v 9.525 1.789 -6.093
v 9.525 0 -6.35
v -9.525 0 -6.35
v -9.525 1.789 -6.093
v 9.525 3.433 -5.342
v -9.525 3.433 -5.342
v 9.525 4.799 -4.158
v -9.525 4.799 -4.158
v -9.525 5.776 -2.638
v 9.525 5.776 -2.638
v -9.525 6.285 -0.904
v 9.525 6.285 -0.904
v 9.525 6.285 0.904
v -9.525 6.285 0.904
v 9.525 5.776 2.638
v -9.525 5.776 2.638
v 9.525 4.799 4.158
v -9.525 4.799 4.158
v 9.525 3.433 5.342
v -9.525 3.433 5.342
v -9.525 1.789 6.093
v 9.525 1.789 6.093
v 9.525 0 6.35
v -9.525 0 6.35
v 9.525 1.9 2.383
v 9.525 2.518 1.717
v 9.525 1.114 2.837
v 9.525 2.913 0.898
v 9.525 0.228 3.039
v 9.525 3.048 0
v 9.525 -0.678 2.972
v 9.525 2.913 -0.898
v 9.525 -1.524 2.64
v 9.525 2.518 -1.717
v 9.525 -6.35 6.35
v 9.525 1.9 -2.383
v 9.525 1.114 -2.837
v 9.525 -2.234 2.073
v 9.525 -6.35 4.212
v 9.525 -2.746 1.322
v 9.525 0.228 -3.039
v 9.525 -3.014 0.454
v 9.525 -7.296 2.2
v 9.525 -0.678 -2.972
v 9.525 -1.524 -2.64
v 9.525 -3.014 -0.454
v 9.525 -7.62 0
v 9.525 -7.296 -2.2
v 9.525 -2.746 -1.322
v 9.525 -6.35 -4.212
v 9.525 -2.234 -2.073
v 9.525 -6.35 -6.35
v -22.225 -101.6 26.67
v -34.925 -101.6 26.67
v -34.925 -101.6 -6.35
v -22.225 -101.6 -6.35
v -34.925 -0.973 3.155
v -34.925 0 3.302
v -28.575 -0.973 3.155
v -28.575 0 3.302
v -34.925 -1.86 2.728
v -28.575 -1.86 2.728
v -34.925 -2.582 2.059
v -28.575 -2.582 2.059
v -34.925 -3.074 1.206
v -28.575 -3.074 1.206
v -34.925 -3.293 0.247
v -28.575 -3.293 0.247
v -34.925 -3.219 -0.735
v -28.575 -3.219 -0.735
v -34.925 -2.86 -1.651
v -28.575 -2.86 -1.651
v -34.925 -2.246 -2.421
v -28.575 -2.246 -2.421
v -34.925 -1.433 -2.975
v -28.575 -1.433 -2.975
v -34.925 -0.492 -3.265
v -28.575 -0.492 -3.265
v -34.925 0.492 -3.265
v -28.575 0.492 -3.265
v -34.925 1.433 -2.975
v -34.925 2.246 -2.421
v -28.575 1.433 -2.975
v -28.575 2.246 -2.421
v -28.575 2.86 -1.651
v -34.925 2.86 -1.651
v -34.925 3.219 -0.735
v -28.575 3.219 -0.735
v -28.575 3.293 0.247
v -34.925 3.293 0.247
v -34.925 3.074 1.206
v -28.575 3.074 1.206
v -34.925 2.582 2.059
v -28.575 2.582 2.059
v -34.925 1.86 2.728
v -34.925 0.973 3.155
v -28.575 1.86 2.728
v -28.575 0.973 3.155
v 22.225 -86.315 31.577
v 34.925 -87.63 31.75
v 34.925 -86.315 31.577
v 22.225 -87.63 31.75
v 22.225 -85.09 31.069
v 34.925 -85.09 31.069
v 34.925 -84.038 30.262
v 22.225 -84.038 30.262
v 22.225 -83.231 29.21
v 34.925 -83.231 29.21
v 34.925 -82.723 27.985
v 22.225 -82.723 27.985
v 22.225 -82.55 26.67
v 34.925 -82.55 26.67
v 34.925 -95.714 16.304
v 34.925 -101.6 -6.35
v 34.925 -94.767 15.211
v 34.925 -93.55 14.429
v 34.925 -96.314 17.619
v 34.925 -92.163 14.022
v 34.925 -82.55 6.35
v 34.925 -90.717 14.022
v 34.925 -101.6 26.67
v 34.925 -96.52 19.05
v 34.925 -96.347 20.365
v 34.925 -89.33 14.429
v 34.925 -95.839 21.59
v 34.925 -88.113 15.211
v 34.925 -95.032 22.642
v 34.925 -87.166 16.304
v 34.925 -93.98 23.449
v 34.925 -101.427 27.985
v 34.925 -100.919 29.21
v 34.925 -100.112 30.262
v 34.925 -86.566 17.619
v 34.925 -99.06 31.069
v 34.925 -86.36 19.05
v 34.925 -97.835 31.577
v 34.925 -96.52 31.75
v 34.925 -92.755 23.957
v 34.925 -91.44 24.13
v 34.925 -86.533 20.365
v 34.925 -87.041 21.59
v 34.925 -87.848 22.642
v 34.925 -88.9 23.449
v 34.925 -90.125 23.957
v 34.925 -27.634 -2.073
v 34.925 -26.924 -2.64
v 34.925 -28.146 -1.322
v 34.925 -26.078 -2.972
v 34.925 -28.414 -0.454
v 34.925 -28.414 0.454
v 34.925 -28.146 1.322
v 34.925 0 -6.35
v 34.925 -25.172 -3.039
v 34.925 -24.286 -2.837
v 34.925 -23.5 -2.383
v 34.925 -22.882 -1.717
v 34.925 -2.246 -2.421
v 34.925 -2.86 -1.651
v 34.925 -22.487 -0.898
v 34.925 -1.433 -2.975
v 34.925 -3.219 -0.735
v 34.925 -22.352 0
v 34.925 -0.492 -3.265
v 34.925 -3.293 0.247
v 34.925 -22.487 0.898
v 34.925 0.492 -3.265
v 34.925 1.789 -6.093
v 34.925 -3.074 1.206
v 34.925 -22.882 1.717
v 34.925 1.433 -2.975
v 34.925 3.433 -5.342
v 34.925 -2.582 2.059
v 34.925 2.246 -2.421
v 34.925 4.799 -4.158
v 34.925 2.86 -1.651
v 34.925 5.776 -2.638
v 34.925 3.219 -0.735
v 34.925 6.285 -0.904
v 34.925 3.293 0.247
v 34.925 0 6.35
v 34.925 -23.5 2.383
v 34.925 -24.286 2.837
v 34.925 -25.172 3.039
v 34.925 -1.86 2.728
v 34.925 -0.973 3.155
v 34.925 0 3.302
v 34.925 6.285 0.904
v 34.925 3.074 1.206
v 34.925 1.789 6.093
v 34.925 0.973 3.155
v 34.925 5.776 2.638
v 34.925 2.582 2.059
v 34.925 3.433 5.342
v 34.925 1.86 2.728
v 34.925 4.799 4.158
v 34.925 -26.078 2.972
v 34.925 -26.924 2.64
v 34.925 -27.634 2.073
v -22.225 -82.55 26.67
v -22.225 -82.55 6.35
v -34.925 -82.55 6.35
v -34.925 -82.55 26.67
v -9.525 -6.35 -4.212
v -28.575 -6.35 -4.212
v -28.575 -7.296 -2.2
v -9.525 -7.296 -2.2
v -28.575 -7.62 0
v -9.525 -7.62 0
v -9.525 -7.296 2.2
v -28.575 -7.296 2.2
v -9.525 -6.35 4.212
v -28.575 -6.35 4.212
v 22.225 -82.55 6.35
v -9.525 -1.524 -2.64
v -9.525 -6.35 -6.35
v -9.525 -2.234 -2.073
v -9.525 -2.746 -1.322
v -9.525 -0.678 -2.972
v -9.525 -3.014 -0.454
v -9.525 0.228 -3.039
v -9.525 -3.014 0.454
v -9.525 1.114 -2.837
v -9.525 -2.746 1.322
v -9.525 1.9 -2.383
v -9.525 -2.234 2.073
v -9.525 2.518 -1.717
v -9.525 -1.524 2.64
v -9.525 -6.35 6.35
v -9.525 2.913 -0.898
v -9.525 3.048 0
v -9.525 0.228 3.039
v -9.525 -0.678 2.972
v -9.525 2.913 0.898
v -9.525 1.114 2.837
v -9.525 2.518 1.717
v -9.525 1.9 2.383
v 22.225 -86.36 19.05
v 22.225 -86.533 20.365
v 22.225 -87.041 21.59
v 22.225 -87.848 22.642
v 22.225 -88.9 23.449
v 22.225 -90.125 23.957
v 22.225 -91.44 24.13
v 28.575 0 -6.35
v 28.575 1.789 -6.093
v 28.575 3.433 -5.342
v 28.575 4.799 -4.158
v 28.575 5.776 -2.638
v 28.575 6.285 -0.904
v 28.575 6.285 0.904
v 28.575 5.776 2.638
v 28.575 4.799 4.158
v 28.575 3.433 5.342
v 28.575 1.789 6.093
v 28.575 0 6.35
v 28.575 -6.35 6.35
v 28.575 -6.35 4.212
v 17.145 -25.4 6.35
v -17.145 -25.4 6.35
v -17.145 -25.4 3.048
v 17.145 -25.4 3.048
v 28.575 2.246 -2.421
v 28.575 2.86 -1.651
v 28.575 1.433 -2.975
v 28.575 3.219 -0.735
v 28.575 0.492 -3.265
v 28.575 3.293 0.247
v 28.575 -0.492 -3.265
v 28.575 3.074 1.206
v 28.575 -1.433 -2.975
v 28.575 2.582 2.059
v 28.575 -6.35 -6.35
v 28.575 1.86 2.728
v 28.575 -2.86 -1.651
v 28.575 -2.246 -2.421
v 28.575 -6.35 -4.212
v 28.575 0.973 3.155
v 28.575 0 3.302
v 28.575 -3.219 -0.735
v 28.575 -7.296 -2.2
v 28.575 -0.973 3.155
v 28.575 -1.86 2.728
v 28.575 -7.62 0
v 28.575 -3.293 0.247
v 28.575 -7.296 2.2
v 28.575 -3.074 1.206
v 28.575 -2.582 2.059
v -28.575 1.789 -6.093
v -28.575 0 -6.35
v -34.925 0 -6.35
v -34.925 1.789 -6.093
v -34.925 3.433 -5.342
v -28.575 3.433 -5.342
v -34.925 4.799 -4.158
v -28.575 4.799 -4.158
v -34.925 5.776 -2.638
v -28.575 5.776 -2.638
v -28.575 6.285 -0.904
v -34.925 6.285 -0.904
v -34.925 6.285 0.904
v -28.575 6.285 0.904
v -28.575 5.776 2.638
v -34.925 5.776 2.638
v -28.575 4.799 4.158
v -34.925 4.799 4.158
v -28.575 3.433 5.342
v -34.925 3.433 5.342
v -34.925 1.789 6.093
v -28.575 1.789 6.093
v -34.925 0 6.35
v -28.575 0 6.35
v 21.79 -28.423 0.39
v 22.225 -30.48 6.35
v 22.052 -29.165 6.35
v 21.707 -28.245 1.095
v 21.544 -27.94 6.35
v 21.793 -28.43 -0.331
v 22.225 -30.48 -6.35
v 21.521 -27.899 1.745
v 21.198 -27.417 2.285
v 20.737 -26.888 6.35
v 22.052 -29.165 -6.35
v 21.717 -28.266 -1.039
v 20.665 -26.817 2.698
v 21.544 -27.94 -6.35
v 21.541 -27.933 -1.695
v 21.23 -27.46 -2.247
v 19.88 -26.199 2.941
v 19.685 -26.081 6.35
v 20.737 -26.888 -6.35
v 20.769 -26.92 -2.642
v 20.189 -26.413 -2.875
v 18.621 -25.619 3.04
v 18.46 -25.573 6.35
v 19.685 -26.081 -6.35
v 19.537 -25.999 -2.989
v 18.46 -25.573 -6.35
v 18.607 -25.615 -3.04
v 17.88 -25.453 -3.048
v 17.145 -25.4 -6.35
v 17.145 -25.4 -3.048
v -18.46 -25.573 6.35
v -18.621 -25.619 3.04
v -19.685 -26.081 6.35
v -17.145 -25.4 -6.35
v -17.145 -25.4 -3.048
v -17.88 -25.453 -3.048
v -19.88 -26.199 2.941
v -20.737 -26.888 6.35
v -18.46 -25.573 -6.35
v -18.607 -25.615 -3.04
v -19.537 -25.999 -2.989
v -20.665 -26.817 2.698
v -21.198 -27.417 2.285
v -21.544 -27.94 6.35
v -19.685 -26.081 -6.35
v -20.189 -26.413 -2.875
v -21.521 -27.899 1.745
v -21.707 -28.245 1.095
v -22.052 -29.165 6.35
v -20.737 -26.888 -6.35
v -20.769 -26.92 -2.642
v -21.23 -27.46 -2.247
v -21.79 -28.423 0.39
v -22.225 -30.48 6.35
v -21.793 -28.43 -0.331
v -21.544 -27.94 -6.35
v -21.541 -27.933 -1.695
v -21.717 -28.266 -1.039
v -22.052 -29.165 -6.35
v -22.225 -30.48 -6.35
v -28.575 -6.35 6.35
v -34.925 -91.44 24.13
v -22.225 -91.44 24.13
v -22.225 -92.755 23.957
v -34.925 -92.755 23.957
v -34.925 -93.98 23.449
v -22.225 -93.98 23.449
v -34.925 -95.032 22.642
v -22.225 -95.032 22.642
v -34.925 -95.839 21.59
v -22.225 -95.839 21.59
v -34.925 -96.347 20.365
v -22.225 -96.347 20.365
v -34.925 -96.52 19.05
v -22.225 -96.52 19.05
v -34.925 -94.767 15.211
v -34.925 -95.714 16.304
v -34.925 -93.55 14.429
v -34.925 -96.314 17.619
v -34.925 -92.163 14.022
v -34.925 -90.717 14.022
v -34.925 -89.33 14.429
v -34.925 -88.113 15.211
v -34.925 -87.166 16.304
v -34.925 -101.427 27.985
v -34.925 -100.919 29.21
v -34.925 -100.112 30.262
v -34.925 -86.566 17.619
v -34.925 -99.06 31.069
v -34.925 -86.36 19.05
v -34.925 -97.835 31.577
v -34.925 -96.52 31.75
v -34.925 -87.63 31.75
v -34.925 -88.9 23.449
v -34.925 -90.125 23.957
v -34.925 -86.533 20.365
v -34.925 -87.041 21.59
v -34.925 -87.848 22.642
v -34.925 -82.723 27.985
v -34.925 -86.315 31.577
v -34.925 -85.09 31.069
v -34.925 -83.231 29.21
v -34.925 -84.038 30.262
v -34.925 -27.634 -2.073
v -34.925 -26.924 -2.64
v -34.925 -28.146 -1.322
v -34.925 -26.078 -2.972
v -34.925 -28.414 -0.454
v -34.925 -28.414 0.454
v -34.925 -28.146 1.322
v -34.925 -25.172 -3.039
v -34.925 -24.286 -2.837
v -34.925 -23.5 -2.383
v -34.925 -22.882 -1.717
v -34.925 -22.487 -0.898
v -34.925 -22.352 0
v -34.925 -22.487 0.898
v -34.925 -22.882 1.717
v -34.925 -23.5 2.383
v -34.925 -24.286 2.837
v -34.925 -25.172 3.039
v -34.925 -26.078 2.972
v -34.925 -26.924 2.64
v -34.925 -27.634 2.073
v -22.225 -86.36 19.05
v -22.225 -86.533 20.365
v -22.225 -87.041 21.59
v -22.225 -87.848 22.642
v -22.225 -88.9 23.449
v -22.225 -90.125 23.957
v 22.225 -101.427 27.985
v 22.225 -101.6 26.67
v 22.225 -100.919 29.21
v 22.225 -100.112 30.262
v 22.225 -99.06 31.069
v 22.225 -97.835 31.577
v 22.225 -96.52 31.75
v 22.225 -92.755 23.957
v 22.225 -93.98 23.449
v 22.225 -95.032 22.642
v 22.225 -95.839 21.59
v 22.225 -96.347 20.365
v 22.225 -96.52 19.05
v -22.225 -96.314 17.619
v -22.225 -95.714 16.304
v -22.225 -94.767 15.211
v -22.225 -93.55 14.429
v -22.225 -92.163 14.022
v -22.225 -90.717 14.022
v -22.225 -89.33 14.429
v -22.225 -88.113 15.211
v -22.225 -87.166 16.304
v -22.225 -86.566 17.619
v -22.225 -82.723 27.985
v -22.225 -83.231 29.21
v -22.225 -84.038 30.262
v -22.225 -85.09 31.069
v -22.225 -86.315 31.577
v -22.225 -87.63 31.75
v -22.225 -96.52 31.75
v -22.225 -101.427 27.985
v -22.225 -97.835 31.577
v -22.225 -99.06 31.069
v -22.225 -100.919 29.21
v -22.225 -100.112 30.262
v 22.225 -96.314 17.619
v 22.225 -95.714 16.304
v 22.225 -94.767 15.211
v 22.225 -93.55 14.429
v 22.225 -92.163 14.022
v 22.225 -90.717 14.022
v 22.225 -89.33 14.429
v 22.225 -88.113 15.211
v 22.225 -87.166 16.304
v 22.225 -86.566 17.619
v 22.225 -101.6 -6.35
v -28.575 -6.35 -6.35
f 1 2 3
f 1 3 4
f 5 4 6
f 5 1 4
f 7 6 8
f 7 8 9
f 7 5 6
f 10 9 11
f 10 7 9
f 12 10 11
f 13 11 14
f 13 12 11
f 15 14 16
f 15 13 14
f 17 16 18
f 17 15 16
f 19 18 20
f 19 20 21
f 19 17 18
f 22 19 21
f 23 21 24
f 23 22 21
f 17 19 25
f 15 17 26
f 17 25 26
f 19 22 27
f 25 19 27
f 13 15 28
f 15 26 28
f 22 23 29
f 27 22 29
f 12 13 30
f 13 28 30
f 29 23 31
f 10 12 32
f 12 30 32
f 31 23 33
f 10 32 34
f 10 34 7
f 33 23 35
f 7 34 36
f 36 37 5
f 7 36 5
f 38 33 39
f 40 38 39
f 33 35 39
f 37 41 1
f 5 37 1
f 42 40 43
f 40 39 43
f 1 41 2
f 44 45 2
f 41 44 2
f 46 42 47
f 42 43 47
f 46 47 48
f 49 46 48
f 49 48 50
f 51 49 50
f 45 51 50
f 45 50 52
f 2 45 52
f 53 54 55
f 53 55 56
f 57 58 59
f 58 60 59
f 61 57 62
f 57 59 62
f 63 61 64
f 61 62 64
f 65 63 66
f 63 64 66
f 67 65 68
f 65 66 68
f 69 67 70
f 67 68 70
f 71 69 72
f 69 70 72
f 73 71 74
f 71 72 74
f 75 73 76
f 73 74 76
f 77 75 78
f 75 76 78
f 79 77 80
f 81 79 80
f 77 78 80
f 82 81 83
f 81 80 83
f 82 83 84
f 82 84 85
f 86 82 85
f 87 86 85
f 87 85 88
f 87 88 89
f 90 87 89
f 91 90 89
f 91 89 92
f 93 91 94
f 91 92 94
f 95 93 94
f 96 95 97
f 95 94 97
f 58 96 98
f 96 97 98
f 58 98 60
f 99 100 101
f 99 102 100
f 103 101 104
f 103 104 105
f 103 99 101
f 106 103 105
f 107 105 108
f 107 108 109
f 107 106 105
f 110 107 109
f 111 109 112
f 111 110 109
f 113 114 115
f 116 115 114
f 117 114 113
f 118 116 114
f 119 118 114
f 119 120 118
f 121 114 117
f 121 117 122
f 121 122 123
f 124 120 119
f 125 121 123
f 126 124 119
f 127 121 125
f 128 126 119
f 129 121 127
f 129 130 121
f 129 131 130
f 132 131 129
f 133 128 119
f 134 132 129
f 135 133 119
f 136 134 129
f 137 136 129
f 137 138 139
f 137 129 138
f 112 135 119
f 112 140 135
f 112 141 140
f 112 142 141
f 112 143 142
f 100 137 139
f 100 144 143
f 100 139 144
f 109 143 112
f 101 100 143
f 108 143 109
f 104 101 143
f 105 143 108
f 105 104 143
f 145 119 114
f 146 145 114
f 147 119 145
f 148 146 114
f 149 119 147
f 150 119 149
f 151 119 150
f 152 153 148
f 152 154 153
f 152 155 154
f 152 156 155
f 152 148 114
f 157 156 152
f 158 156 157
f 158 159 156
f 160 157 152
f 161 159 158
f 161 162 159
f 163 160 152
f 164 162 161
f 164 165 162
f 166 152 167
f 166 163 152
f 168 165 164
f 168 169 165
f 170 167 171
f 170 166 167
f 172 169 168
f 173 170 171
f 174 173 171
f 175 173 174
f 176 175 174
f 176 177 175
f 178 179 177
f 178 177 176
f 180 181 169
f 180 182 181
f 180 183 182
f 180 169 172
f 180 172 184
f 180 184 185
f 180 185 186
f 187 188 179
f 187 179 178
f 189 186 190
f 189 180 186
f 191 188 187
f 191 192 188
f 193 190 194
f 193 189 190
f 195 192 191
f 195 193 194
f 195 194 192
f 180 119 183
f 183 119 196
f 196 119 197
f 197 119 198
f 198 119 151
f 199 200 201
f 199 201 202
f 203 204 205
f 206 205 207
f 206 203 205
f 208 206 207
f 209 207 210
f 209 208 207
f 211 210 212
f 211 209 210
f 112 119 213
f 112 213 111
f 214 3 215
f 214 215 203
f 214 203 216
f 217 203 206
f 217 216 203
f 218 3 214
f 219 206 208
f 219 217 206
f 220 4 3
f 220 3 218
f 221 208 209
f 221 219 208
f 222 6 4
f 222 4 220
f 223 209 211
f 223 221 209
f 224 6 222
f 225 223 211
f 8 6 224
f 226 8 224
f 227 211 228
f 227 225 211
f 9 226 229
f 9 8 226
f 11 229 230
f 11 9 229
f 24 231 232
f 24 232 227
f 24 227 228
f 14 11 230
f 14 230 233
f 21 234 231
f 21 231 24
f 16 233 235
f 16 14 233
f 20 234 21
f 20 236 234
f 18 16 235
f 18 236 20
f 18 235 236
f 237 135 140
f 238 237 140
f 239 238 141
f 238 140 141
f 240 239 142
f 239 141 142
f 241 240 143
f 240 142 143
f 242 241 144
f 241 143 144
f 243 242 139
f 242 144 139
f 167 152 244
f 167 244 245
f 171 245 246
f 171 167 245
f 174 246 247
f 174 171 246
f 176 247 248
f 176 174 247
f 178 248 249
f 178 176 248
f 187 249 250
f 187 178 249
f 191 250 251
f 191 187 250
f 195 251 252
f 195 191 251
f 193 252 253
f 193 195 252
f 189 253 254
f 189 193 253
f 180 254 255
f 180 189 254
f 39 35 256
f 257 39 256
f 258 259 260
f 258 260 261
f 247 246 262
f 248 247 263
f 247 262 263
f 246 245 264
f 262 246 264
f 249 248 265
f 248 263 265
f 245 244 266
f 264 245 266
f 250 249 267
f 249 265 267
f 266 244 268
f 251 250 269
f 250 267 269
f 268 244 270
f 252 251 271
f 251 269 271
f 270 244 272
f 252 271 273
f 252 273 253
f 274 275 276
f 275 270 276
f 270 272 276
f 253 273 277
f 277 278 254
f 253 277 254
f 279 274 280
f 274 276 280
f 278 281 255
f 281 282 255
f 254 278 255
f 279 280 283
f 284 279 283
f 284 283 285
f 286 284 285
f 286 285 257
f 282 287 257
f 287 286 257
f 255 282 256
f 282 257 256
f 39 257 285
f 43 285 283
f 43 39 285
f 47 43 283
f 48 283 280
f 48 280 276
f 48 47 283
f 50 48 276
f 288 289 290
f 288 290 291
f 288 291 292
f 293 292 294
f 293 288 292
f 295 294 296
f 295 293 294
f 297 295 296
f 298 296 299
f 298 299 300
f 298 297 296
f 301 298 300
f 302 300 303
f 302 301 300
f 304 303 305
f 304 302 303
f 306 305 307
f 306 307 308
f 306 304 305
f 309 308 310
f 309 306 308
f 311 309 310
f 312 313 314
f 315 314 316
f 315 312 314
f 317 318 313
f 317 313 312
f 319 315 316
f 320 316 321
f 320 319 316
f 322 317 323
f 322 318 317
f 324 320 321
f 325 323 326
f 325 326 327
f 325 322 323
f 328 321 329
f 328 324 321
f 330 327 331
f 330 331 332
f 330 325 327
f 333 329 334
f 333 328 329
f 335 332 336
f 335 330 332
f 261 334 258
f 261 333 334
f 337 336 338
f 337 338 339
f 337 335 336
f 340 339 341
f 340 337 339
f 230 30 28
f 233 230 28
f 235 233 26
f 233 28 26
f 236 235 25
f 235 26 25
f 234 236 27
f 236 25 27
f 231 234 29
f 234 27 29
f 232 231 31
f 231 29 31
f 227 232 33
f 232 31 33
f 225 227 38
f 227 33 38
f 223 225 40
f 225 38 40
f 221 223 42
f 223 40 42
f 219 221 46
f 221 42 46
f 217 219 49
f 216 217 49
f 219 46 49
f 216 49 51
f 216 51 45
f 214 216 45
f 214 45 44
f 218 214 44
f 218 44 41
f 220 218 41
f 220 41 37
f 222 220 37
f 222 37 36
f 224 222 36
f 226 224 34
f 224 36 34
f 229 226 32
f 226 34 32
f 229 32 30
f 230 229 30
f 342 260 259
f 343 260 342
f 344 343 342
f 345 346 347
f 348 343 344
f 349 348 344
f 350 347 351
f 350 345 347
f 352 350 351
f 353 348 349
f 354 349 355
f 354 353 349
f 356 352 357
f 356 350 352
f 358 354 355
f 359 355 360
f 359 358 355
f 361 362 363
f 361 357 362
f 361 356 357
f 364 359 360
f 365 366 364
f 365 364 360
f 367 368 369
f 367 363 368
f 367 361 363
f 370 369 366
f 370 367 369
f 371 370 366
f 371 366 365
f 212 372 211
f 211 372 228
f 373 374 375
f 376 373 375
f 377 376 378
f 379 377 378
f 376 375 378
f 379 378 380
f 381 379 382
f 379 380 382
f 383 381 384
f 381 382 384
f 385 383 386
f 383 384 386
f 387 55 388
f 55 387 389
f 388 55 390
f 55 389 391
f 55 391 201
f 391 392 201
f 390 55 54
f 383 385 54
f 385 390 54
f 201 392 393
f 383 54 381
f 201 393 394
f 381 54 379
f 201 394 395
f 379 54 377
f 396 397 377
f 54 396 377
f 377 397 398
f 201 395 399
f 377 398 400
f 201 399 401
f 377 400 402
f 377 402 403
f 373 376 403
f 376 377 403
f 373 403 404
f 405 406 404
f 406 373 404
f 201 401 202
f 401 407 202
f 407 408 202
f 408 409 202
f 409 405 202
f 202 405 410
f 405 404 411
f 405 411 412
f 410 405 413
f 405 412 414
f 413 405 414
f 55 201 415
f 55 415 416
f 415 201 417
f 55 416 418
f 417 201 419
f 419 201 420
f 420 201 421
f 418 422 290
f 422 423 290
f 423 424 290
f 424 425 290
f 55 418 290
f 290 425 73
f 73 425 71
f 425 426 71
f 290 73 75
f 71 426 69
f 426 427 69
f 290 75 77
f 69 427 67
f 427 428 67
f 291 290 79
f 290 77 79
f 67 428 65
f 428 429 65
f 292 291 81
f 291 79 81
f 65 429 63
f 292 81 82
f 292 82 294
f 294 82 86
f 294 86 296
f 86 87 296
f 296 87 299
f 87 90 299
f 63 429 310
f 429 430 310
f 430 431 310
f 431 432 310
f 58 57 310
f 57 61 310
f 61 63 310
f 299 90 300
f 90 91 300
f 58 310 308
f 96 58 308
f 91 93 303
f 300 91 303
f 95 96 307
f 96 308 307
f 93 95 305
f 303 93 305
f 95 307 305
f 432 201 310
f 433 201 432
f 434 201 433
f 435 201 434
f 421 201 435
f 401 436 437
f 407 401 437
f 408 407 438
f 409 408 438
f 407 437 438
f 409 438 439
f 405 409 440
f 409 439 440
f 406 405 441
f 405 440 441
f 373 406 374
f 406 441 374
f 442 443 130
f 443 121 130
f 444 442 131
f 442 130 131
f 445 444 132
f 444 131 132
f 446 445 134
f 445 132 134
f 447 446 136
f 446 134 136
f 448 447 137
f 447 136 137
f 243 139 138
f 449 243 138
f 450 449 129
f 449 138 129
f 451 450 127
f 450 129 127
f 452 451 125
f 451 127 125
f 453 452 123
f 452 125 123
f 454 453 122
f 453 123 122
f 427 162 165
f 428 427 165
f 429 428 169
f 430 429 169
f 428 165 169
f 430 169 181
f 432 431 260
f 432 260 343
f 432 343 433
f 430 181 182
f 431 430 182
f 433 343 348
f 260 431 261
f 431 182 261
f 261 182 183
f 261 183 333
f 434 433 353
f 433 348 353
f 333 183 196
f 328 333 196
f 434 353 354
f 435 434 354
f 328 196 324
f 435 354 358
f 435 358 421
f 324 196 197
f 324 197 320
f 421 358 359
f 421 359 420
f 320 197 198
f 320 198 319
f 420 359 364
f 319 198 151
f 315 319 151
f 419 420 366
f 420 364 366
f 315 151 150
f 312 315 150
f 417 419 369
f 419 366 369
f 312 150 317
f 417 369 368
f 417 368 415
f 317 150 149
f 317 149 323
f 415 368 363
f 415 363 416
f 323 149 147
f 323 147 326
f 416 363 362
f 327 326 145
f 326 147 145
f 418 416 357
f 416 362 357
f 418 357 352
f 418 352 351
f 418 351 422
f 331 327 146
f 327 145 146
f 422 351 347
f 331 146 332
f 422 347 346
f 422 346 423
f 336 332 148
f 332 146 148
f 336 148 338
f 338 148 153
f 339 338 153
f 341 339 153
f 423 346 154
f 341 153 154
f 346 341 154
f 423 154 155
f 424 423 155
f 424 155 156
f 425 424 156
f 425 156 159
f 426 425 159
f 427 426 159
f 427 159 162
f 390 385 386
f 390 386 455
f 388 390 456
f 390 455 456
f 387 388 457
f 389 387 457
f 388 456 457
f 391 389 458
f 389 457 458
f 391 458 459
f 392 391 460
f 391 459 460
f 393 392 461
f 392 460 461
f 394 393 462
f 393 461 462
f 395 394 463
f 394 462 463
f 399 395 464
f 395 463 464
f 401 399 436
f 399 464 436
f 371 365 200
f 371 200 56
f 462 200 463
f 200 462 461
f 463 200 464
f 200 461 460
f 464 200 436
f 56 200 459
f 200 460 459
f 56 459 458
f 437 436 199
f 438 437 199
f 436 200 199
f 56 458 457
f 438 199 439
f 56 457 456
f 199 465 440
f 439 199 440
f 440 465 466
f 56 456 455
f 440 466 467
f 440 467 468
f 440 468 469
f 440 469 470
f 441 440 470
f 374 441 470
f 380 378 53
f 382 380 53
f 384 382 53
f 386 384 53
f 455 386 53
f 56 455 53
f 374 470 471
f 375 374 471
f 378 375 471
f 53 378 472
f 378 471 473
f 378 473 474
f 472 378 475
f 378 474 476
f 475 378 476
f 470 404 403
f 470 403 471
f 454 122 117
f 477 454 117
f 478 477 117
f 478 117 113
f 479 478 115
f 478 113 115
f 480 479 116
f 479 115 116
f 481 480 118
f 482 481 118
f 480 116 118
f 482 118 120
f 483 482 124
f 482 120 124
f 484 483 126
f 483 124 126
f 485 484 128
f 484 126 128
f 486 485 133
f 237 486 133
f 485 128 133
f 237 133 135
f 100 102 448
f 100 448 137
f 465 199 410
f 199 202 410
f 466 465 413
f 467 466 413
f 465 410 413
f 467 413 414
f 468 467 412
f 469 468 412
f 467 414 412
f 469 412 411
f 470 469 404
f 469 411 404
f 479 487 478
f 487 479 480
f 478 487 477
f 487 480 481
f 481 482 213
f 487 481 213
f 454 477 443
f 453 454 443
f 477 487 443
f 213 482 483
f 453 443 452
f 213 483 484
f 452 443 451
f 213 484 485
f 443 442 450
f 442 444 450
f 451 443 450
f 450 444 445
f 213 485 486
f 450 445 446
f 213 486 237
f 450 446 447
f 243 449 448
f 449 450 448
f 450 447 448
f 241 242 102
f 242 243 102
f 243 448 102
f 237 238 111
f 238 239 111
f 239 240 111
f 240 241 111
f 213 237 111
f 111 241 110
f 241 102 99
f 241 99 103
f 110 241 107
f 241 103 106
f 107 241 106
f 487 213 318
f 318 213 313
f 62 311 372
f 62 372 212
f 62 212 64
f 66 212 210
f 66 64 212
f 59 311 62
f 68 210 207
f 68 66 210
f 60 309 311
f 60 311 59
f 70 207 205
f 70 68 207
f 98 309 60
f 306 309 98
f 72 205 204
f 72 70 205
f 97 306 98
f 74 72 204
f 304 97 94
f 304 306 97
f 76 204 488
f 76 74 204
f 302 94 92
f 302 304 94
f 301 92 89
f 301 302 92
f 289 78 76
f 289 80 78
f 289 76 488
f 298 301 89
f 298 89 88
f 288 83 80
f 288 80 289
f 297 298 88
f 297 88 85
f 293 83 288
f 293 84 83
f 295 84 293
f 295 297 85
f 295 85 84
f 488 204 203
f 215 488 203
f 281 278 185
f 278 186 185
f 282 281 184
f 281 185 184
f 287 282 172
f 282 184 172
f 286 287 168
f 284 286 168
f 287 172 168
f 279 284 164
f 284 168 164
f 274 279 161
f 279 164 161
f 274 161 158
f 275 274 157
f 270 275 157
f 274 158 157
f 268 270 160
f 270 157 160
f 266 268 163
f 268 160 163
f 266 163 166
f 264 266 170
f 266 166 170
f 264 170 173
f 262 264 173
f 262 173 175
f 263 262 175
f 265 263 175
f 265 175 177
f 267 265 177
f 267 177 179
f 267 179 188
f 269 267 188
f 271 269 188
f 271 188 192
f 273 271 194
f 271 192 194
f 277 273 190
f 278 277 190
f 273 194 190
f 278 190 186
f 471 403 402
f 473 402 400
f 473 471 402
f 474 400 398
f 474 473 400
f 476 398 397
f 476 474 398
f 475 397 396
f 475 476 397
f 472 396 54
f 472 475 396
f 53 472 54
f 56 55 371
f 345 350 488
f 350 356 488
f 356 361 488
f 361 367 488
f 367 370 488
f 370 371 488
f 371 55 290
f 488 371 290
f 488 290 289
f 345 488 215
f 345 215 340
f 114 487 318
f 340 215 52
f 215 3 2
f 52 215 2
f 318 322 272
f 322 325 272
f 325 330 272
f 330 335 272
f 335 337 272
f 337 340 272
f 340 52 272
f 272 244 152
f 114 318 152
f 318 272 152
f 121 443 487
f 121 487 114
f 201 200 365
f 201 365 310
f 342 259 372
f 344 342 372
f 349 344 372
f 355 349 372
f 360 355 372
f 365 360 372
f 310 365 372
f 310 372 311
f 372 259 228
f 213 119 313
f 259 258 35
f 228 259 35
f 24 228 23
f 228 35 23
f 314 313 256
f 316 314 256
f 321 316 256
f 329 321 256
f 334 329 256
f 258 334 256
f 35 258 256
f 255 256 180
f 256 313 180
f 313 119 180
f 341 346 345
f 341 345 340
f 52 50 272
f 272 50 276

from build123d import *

# Parameters (mm, degrees)
F0_W      = 12.7
F0_H      = 25.4
F1_DEPTH  = 101.6
F2_W      = 82.55
F2_H      = 25.4
F3_DEPTH  = 69.851
F4_W      = 44.45
F4_H      = 50.8
F4_H_2    = 25.4
F5_DEPTH  = 25.4
F6_R      = 5.08
F7_R      = 6.35
F7_R_2    = 3.302
F8_DEPTH  = 69.85
F9_R      = 3.302
F10_DEPTH = 69.851
F12_DEPTH = 6.35
F13_R     = 4.8460610966
F13_R_2   = 3.048
F14_DEPTH = 19.05
F15_R     = 3.048
F16_DEPTH = 69.851
F18_R     = 7.62
F19_DEPTH = 19.05
F20_R     = 7.62
F21_DEPTH = 19.05


# Not quite as in the source:
# - two fillets or chamfers of one size are made in one step
# - a feature names something its author has since deleted; it is built from what else it names


with BuildPart() as f1:
    # F0 (on Front) → F1 (new body)
    with BuildSketch(Plane.XZ):
        Polygon((34.925, -6.35), (34.925, 6.35), (22.225, 6.35), (-22.225, 6.35), (-34.925, 6.35), (-34.925, -6.35), align=None)
        with Locations((28.575, 19.05)):
            Rectangle(F0_W, F0_H)
        with Locations((-28.575, 19.05)):
            Rectangle(F0_W, F0_H)
    extrude(amount=F1_DEPTH)

    # F2 (on face) → F3 (cut, through all)
    with BuildSketch(Plane.YZ.offset(34.925)):
        with Locations((-41.275, 19.05)):
            Rectangle(F2_W, F2_H)
        with BuildLine():
            ThreePointArc((-86.36, 19.05), (-87.8478975516, 22.6421024484), (-91.44, 24.13))
            Line((-91.44, 24.13), (-91.44, 19.05))
            Line((-91.44, 19.05), (-96.52, 19.05))
            ThreePointArc((-96.52, 19.05), (-91.44, 13.97), (-86.36, 19.05))
        make_face()
        with BuildLine():
            Line((-91.44, 19.05), (-91.44, 24.13))
            ThreePointArc((-91.44, 24.13), (-95.0321024484, 22.6421024484), (-96.52, 19.05))
            Line((-96.52, 19.05), (-91.44, 19.05))
        make_face()
    extrude(amount=-F3_DEPTH, mode=Mode.SUBTRACT)

    # F4 (on face) → F5 (cut)
    with BuildSketch(Plane.XY.offset(6.35)):
        with Locations((0, -50.8)):
            Rectangle(F4_W, F4_H)
        with Locations((0, -88.9)):
            Rectangle(F4_W, F4_H_2)
    extrude(amount=-F5_DEPTH, mode=Mode.SUBTRACT)

    # F6
    f6_edges = [f1.edges().sort_by_distance(p)[0] for p in [
        (-28.575, -101.6, 31.75),
        (-28.575, -82.55, 31.75),
        (28.575, -101.6, 31.75),
        (28.575, -82.55, 31.75),
        (22.225, -25.4, 0),
        (-22.225, -25.4, 0),
    ]]
    fillet(f6_edges, radius=F6_R)

    # F7 (on face) → F8 (join, through all)
    with BuildSketch(Plane.YZ.offset(34.925)):
        Circle(F7_R)
        Circle(F7_R_2, mode=Mode.SUBTRACT)
    extrude(amount=-F8_DEPTH)

    # F9 (on face) → F10 (cut, through all)
    with BuildSketch(Plane.YZ.offset(34.925)):
        Circle(F9_R)
    extrude(amount=-F10_DEPTH, mode=Mode.SUBTRACT)

    # F11 (on Front) → F12 (cut, symmetric)
    with BuildSketch(Plane.XZ):
        Polygon((-9.525, -12.2059704736), (-9.525, 0), (-9.525, 12.2059704736), (-28.575, 12.2059704736), (-28.575, -12.2059704736), align=None)
        Polygon((9.525, 10.1526007056), (9.525, 0), (9.525, -10.1526007056), (28.575, -10.1526007056), (28.575, 10.1526007056), align=None)
    extrude(amount=F12_DEPTH, both=True, mode=Mode.SUBTRACT)

    # F13 (on face) → F14 (join, through all)
    with BuildSketch(Plane.YZ.offset(9.525)):
        Circle(F13_R)
        Circle(F13_R_2, mode=Mode.SUBTRACT)
    extrude(amount=-F14_DEPTH)

    # F15 (on face) → F16 (cut, through all)
    with BuildSketch(Plane.YZ.offset(34.925)):
        with Locations((-25.4, 0)):
            Circle(F15_R)
    extrude(amount=-F16_DEPTH, mode=Mode.SUBTRACT)

    # F18 (on face) → F19 (cut, through all)
    with BuildSketch(Plane.YZ.offset(9.525)):
        Circle(F18_R)
    extrude(amount=F19_DEPTH, mode=Mode.SUBTRACT)

    # F20 (on face) → F21 (cut, through all)
    with BuildSketch(Plane(origin=(-9.525, 0, 0), x_dir=(0, -1, 0), z_dir=(-1, 0, 0))):
        Circle(F20_R)
    extrude(amount=F21_DEPTH, mode=Mode.SUBTRACT)


solid = f1.part
